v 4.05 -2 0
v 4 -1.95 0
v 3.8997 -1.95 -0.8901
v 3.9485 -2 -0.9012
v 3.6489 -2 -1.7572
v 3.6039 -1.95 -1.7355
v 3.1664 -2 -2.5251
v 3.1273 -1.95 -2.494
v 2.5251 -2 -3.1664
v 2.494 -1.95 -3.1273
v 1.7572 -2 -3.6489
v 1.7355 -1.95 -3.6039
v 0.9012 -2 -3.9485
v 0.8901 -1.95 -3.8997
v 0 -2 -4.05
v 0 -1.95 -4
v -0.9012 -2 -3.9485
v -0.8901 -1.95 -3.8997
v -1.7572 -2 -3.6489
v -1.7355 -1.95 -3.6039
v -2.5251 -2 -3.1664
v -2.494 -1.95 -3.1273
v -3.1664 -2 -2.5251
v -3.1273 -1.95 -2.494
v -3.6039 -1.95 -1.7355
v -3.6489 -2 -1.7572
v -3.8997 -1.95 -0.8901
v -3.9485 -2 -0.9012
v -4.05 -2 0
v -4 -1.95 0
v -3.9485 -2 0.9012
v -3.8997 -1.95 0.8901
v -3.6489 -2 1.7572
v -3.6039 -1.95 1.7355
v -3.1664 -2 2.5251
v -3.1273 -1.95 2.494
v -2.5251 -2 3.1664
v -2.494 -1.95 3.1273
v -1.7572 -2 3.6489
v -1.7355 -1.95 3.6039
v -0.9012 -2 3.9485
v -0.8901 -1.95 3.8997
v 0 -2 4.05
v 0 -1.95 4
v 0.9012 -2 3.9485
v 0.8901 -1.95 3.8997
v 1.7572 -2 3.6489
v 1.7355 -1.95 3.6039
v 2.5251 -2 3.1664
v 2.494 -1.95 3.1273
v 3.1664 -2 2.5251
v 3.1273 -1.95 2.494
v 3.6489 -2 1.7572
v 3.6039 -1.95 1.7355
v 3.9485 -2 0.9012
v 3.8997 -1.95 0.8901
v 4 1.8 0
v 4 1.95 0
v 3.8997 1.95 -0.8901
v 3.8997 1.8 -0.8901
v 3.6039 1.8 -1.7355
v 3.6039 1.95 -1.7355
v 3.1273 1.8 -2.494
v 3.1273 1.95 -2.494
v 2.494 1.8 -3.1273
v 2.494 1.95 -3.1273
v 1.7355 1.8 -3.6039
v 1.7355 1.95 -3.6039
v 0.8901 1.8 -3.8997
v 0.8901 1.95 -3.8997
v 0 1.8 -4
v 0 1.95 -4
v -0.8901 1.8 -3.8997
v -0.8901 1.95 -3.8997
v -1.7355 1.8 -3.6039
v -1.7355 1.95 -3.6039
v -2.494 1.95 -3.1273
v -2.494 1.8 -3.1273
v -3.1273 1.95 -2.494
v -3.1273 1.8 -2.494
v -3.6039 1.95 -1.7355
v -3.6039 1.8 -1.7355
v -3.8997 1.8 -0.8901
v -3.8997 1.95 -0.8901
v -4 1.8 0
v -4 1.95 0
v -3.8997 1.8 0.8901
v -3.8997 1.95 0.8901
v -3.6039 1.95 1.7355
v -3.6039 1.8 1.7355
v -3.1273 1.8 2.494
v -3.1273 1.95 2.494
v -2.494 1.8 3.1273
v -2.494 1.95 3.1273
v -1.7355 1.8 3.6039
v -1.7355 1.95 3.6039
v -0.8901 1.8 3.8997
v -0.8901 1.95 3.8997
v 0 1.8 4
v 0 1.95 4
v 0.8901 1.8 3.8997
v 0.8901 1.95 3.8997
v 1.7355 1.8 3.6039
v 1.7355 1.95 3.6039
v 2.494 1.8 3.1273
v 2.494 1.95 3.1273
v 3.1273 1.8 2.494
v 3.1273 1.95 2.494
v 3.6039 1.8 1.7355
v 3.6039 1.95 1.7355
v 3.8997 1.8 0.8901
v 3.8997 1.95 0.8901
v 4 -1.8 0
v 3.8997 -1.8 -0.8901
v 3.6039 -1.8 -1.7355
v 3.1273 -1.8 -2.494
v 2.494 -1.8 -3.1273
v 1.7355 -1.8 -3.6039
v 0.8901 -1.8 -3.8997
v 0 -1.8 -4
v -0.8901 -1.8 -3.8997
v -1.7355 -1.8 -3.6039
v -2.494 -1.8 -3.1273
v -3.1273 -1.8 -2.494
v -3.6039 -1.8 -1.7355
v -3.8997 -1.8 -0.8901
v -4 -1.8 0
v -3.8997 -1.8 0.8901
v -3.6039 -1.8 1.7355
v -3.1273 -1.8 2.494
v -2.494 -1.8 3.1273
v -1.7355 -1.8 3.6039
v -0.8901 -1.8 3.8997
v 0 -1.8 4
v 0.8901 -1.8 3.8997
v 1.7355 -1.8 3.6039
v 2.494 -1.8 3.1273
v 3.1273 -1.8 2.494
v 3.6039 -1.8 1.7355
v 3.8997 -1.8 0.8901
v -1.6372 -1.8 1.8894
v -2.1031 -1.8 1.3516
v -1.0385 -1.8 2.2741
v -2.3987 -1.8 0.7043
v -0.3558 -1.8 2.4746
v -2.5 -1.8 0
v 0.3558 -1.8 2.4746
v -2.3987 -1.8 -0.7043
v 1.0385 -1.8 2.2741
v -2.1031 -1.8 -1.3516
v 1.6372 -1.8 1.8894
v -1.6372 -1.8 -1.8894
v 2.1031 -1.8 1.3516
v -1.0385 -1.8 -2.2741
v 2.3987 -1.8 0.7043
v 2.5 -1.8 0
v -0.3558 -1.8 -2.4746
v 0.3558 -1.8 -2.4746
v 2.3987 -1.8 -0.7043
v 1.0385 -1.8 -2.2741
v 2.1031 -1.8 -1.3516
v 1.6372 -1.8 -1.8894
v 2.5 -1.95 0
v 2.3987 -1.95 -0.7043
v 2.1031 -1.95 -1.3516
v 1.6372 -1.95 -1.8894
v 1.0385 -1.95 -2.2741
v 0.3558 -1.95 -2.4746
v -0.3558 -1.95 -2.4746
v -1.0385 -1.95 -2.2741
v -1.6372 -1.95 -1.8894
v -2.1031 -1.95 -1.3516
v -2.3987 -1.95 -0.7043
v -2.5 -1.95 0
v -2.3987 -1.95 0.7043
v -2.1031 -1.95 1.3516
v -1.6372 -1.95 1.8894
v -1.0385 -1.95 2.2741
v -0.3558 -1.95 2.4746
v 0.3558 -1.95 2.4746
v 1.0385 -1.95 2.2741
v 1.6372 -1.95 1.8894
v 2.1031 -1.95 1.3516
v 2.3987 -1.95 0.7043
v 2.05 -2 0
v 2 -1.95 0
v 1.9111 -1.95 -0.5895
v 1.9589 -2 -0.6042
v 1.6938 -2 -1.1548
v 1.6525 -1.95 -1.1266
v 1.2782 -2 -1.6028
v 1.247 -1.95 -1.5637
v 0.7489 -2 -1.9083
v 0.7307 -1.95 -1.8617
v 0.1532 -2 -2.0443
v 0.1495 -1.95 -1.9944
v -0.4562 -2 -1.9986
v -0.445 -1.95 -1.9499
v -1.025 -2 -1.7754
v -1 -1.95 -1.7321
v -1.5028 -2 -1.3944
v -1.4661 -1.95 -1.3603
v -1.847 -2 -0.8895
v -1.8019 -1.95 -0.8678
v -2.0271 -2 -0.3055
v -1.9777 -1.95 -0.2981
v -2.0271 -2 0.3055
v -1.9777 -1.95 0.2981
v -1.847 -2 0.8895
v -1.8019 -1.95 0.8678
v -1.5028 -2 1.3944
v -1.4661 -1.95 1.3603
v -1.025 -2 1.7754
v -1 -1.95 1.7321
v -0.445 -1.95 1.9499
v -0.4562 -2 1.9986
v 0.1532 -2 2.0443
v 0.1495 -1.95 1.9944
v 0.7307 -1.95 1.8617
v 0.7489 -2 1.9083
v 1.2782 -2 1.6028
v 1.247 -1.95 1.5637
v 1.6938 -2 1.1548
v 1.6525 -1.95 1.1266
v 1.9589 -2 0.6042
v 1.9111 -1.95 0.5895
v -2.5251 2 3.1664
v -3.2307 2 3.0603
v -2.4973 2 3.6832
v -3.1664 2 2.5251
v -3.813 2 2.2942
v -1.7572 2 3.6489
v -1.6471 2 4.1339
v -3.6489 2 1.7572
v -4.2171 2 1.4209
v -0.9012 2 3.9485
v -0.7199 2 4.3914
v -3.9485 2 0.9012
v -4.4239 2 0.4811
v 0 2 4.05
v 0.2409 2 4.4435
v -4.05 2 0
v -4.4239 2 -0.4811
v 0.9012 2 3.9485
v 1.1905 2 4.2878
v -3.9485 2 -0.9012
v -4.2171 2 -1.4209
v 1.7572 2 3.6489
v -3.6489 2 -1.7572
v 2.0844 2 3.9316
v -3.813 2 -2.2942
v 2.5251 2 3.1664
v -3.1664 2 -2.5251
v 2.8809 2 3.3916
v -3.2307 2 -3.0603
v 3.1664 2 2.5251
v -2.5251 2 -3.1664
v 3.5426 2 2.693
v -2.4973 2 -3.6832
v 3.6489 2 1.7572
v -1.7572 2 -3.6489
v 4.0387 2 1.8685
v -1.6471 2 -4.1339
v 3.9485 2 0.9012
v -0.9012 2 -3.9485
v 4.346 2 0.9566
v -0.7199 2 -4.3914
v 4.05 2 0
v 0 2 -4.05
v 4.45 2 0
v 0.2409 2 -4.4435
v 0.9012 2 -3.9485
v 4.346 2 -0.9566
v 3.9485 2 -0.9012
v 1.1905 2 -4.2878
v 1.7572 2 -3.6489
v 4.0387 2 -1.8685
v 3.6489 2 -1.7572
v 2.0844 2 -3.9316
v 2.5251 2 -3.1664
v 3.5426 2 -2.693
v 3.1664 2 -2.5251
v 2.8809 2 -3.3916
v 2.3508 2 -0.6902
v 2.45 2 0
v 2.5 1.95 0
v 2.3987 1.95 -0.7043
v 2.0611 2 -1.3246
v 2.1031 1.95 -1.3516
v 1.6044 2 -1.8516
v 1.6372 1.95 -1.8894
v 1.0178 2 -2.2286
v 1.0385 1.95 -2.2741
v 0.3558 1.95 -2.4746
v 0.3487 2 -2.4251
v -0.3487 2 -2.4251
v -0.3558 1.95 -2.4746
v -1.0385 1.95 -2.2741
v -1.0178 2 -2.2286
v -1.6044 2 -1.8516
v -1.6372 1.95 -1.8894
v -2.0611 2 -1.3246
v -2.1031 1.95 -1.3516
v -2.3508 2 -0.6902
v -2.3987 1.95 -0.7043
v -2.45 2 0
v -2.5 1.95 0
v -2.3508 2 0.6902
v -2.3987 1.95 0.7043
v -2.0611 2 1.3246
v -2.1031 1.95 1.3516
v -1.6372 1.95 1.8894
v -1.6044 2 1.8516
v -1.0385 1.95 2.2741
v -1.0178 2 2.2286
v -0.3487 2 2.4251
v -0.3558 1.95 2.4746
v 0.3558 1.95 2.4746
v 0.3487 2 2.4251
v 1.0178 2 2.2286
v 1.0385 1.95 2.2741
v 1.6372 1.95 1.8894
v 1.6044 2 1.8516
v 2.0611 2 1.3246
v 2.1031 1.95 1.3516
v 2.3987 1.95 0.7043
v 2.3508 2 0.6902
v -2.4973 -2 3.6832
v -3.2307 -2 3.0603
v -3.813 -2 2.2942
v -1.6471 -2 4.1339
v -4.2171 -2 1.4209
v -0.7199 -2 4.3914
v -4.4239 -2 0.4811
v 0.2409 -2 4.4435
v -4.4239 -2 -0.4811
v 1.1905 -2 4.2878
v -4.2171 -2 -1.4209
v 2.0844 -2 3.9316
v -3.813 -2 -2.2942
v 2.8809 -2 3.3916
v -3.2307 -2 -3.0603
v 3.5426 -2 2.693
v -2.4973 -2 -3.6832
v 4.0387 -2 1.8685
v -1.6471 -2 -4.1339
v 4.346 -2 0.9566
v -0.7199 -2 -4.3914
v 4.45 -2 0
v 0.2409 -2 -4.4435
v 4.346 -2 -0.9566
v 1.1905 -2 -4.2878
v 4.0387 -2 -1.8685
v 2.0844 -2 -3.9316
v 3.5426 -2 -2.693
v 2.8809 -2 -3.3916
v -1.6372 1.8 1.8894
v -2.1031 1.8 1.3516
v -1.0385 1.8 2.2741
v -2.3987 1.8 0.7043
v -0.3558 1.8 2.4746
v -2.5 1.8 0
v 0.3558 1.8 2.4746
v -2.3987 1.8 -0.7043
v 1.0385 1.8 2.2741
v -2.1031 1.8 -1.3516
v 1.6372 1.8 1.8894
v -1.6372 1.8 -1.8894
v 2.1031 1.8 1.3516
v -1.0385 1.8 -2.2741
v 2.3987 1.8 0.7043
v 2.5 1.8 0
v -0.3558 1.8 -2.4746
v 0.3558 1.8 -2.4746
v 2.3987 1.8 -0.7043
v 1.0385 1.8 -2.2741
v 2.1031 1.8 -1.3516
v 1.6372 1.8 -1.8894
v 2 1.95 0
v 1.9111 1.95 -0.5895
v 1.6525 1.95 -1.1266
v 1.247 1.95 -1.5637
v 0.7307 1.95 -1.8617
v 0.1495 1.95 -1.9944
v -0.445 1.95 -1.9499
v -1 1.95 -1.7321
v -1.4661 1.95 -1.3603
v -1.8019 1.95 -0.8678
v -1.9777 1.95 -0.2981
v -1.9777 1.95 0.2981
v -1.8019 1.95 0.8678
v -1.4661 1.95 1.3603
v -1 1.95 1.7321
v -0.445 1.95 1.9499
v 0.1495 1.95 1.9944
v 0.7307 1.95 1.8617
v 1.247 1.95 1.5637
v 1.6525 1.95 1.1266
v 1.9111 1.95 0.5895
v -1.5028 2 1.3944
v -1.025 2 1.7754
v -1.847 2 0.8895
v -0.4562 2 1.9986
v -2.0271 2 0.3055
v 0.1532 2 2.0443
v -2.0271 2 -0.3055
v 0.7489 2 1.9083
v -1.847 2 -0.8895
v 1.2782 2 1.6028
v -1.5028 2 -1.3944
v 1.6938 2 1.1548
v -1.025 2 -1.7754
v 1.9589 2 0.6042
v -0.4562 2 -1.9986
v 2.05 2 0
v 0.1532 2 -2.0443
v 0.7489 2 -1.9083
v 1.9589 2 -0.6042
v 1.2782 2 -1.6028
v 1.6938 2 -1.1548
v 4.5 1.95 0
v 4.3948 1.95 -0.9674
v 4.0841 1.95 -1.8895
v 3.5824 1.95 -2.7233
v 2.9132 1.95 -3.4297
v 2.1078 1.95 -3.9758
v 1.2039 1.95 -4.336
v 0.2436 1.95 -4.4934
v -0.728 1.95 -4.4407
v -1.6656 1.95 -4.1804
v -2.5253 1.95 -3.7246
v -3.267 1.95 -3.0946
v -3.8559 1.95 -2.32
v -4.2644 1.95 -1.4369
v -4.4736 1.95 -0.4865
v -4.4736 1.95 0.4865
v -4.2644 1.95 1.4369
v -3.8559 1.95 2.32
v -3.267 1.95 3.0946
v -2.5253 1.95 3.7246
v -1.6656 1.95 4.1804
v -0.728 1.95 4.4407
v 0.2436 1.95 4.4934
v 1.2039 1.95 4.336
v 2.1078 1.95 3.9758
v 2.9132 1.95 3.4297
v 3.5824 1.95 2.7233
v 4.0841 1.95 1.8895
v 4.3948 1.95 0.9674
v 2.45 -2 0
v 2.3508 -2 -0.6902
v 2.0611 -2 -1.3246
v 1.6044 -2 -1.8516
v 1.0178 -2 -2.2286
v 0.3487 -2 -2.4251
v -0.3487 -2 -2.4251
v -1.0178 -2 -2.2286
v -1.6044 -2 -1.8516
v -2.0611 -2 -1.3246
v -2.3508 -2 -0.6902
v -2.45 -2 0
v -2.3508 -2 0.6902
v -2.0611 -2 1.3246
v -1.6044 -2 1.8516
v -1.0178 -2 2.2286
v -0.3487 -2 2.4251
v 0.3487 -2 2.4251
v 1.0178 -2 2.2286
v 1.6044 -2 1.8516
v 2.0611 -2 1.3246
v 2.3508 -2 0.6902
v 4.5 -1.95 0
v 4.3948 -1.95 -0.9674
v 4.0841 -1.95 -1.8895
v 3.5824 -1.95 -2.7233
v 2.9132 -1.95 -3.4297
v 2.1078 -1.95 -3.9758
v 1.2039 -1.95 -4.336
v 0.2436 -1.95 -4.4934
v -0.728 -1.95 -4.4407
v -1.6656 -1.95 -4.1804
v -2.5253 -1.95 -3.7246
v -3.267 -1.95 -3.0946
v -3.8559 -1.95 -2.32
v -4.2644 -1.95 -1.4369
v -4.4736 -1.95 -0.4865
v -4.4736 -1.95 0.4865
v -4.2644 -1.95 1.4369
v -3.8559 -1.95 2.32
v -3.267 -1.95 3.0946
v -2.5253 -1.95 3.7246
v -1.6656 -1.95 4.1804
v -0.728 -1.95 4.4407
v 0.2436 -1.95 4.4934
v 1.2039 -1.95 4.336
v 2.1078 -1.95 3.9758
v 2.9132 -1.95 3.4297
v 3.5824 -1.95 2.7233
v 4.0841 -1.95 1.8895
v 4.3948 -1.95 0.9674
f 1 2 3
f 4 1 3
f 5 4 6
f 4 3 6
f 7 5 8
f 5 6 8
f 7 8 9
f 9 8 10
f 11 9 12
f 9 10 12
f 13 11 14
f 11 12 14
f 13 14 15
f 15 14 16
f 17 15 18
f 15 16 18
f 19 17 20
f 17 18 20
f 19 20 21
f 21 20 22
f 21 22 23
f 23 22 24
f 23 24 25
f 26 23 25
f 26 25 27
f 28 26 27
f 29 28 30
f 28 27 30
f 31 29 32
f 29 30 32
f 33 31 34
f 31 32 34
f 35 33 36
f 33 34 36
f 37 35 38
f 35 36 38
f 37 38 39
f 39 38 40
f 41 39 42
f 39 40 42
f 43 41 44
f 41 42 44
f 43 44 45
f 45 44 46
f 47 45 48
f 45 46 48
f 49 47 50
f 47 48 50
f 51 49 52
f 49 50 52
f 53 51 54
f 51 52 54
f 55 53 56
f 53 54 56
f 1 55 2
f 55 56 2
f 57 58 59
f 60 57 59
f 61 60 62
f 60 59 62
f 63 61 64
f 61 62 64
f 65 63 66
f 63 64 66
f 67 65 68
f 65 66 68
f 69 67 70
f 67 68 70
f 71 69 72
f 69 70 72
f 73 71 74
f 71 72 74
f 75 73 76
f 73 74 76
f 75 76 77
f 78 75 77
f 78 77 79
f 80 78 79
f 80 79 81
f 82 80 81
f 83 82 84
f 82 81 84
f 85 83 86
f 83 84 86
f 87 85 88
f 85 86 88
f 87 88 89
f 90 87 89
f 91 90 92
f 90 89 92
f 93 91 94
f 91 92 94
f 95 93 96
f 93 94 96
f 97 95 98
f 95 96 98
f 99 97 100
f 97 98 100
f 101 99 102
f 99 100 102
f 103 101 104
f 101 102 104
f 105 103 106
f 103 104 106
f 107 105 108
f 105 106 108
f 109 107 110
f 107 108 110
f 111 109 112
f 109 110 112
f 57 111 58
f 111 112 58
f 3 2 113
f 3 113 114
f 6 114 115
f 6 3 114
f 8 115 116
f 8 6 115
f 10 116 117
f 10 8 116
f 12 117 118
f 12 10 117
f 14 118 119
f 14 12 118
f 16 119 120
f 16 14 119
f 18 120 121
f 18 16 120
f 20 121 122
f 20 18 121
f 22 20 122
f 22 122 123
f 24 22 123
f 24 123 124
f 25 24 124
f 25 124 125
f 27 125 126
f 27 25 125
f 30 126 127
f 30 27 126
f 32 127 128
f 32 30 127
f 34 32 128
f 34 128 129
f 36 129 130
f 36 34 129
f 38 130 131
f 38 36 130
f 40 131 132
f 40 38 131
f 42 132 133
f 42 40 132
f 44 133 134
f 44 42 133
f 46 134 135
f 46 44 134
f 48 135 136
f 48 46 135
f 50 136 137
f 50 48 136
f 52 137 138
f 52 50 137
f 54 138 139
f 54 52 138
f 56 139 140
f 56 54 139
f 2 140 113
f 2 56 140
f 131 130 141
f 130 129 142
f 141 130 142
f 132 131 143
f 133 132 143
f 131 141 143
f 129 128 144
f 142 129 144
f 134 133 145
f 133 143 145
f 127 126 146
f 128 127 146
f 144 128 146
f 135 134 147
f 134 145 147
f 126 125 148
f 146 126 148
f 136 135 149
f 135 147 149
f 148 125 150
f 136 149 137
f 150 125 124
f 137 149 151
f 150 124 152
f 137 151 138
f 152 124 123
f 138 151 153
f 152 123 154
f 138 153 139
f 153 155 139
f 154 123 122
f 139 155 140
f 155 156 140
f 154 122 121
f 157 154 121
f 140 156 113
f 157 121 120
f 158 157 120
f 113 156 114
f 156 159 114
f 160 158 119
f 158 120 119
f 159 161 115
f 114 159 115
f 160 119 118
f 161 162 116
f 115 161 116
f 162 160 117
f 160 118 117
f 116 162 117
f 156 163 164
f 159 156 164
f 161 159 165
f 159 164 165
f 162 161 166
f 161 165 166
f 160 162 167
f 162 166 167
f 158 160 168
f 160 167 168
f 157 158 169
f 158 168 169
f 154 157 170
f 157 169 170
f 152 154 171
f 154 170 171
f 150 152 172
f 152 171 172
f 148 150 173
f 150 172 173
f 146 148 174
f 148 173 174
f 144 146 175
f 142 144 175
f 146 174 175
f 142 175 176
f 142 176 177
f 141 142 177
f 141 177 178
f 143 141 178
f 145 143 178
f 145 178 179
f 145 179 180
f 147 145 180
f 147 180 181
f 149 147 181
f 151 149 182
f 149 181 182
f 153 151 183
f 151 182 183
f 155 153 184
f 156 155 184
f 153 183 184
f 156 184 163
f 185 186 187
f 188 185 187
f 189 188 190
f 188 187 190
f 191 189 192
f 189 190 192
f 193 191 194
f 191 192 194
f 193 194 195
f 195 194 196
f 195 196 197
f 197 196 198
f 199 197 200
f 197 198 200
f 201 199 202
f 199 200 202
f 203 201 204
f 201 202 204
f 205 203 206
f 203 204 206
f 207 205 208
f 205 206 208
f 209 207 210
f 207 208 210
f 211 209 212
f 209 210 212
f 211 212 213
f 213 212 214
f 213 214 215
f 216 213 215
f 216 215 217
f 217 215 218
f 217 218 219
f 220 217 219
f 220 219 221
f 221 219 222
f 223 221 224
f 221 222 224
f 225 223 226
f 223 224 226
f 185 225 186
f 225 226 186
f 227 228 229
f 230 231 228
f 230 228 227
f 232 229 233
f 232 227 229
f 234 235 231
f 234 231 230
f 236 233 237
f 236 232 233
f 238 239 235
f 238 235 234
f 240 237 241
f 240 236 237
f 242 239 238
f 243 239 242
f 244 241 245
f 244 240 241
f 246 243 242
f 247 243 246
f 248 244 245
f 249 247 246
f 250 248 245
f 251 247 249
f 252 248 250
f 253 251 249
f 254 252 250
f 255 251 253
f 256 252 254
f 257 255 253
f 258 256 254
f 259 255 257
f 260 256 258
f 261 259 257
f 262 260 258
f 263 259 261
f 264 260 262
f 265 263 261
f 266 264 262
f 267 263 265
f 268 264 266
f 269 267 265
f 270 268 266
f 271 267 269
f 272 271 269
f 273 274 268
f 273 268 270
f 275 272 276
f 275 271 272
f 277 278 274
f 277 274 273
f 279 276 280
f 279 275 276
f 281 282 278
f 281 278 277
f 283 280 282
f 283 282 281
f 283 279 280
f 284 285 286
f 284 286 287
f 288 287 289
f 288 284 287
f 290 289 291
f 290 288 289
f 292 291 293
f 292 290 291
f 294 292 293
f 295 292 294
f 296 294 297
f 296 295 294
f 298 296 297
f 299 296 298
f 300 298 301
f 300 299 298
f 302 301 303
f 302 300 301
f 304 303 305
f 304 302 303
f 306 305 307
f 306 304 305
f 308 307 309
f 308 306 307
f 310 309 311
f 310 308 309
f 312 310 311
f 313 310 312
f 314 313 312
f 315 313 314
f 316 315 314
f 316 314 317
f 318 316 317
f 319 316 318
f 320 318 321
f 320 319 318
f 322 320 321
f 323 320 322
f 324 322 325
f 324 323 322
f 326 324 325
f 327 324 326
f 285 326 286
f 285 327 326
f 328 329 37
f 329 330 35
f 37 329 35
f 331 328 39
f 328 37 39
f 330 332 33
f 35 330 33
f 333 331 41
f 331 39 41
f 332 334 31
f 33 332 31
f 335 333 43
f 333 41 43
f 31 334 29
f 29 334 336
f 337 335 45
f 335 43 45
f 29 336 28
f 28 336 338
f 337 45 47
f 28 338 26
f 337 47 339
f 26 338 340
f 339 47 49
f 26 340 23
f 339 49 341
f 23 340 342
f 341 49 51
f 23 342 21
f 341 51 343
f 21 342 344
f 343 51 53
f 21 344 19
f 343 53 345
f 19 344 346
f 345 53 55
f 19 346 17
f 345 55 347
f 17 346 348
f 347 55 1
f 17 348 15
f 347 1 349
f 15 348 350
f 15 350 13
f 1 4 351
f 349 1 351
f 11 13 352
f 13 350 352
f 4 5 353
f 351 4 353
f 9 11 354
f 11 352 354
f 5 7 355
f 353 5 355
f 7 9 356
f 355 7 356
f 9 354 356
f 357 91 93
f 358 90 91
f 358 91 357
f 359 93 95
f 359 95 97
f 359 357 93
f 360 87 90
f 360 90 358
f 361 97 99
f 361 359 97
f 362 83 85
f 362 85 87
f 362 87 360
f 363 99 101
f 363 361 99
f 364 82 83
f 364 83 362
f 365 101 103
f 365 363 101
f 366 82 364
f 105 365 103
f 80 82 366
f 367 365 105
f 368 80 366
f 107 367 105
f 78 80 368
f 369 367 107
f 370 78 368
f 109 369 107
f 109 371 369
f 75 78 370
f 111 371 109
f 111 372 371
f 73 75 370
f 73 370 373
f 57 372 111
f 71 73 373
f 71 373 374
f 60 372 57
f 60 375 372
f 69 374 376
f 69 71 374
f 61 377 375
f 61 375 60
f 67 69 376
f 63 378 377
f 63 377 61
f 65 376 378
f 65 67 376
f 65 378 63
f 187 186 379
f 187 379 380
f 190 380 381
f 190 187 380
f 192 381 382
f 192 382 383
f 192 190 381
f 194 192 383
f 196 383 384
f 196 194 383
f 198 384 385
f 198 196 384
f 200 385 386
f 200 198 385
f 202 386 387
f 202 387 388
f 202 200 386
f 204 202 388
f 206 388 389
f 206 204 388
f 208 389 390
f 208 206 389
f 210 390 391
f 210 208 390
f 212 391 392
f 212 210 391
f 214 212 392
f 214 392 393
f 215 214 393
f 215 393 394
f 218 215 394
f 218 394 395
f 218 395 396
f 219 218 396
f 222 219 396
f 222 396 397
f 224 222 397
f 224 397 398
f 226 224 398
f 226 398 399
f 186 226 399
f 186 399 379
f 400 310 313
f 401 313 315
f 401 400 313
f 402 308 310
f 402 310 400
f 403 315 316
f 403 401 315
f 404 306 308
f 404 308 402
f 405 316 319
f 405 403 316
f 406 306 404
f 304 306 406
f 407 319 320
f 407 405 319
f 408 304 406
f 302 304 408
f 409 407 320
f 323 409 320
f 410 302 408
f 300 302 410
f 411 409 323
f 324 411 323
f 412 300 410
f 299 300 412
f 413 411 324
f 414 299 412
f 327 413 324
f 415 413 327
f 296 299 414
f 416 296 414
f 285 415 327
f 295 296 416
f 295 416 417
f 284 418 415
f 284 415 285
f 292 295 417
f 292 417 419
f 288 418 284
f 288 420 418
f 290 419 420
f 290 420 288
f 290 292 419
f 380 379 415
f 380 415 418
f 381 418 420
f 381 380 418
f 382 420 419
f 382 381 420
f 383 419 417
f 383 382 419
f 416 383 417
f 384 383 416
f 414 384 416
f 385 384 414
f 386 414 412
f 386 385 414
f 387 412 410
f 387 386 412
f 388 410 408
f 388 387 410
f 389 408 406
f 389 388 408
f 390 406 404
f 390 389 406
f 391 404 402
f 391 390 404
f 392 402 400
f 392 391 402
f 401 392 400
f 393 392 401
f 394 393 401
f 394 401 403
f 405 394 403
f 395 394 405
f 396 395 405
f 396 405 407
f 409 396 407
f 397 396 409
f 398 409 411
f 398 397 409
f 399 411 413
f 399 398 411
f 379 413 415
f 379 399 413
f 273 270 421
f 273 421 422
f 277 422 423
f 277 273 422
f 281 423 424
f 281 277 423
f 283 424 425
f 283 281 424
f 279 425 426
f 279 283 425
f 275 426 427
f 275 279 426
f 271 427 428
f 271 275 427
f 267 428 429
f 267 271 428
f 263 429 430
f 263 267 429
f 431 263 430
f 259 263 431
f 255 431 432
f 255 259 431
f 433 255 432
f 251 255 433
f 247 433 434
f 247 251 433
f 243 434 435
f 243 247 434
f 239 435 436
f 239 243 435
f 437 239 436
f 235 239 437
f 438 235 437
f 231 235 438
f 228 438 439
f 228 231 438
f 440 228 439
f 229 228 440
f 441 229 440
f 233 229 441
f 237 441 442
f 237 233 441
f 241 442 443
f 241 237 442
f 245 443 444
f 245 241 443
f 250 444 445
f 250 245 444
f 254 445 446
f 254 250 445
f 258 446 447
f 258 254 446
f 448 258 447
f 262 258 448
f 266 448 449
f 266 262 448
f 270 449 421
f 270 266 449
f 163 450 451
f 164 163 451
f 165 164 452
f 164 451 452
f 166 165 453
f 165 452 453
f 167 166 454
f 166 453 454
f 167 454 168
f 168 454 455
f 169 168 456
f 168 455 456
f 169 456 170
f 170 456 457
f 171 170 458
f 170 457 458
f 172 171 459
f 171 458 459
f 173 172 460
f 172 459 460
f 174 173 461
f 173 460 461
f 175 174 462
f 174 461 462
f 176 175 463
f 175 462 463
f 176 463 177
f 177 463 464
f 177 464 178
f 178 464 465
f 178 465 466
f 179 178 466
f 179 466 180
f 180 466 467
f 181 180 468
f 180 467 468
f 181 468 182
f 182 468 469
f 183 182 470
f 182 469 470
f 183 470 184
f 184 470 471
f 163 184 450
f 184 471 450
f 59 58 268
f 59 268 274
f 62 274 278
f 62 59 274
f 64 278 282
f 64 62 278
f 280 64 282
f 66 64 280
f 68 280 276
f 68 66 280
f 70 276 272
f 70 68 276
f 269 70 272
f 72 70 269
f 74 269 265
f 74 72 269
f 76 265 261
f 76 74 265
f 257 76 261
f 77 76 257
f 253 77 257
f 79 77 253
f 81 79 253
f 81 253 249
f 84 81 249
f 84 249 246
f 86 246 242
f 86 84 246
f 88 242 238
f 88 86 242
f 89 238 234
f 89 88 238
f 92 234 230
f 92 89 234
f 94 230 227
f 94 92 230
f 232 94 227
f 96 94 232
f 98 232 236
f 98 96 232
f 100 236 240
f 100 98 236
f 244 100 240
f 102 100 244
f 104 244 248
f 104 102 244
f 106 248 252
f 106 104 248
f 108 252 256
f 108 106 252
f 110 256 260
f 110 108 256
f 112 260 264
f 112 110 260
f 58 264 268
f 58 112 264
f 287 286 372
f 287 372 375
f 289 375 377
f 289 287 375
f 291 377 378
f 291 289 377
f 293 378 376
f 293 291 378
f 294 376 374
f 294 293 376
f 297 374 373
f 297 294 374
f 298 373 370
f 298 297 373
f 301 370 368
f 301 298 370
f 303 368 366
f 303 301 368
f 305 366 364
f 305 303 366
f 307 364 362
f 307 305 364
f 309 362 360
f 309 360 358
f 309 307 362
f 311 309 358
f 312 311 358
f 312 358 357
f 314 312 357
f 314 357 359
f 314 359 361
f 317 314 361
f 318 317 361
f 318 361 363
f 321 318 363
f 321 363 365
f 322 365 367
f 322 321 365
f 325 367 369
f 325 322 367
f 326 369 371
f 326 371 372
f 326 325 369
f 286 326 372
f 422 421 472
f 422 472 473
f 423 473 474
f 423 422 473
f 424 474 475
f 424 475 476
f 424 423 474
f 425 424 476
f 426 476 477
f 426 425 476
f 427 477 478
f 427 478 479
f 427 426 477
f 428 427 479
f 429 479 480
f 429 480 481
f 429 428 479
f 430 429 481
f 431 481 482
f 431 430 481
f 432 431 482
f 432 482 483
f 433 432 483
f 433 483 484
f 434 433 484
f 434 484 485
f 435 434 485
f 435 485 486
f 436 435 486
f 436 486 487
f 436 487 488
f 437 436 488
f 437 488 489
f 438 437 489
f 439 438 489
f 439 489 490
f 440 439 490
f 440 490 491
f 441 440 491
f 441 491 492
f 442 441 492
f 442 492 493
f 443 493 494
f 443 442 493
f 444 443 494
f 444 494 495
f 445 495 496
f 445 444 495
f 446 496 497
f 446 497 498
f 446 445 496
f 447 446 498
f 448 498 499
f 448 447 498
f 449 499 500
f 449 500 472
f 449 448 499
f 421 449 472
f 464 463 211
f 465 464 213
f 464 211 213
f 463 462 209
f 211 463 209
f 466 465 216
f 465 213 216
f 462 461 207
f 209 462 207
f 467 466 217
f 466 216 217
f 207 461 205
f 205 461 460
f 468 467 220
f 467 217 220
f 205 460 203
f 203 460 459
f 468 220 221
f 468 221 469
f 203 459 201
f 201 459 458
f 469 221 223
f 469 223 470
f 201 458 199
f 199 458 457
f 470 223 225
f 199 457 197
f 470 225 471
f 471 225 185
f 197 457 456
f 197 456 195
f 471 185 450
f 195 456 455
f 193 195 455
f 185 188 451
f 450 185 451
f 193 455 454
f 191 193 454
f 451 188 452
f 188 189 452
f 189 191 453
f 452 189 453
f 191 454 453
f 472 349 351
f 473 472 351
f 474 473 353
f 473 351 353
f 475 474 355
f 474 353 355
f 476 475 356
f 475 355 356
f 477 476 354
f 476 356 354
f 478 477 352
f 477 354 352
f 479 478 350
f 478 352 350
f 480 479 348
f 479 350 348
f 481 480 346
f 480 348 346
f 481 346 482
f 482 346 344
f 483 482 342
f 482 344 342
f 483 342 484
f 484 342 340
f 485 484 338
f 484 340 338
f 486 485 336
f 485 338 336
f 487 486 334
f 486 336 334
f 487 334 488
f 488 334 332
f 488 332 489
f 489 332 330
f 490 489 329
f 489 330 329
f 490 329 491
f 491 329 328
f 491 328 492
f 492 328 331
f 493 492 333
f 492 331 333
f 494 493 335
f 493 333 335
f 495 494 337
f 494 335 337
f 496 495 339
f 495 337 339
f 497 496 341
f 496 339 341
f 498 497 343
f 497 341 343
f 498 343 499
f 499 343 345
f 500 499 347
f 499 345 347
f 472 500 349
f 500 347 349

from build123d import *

# Parameters (mm, degrees)
SKETCH1_R           = 4.5
SKETCH1_R_2         = 2
BOSS_EXTRUDE1_DEPTH = 2
CUT_EXTRUDE1_START  = 2
SKETCH2_R           = 4
SKETCH2_R_2         = 2.5
CUT_EXTRUDE1_DEPTH  = 0.2
CUT_EXTRUDE3_START  = -2
SKETCH2_2_R         = 4
SKETCH2_2_R_2       = 2.5
CUT_EXTRUDE3_DEPTH  = 0.2
CHAMFER1_SIZE       = 0.05


with BuildPart() as part:
    # Sketch1 → Boss-Extrude1 (new body, symmetric)
    with BuildSketch(Plane(origin=(0, 0, 0), x_dir=(1, 0, 0), z_dir=(0, 1, 0))):
        Circle(SKETCH1_R)
        Circle(SKETCH1_R_2, mode=Mode.SUBTRACT)
    extrude(amount=BOSS_EXTRUDE1_DEPTH, both=True)

    # Sketch2 → Cut-Extrude1 (cut)
    with BuildSketch(Plane(origin=(0, 0, 0), x_dir=(1, 0, 0), z_dir=(0, 1, 0)).offset(CUT_EXTRUDE1_START)):
        Circle(SKETCH2_R)
        Circle(SKETCH2_R_2, mode=Mode.SUBTRACT)
    extrude(amount=-CUT_EXTRUDE1_DEPTH, mode=Mode.SUBTRACT)

    # Sketch2<2> → Cut-Extrude3 (cut)
    with BuildSketch(Plane(origin=(0, 0, 0), x_dir=(1, 0, 0), z_dir=(0, 1, 0)).offset(CUT_EXTRUDE3_START)):
        Circle(SKETCH2_2_R)
        Circle(SKETCH2_2_R_2, mode=Mode.SUBTRACT)
    extrude(amount=CUT_EXTRUDE3_DEPTH, mode=Mode.SUBTRACT)

    # Chamfer1
    chamfer1_edges = [part.edges().sort_by_distance(p)[0] for p in [
        (-4, 2, 0),
        (-2.5, 2, 0),
        (-2.5, -2, 0),
        (-4, -2, 0),
        (-4.5, -2, 0),
        (-4.5, 2, 0),
        (-2, -2, 0),
        (-2, 2, 0),
    ]]
    chamfer(chamfer1_edges, length=CHAMFER1_SIZE)


solid = part.part
